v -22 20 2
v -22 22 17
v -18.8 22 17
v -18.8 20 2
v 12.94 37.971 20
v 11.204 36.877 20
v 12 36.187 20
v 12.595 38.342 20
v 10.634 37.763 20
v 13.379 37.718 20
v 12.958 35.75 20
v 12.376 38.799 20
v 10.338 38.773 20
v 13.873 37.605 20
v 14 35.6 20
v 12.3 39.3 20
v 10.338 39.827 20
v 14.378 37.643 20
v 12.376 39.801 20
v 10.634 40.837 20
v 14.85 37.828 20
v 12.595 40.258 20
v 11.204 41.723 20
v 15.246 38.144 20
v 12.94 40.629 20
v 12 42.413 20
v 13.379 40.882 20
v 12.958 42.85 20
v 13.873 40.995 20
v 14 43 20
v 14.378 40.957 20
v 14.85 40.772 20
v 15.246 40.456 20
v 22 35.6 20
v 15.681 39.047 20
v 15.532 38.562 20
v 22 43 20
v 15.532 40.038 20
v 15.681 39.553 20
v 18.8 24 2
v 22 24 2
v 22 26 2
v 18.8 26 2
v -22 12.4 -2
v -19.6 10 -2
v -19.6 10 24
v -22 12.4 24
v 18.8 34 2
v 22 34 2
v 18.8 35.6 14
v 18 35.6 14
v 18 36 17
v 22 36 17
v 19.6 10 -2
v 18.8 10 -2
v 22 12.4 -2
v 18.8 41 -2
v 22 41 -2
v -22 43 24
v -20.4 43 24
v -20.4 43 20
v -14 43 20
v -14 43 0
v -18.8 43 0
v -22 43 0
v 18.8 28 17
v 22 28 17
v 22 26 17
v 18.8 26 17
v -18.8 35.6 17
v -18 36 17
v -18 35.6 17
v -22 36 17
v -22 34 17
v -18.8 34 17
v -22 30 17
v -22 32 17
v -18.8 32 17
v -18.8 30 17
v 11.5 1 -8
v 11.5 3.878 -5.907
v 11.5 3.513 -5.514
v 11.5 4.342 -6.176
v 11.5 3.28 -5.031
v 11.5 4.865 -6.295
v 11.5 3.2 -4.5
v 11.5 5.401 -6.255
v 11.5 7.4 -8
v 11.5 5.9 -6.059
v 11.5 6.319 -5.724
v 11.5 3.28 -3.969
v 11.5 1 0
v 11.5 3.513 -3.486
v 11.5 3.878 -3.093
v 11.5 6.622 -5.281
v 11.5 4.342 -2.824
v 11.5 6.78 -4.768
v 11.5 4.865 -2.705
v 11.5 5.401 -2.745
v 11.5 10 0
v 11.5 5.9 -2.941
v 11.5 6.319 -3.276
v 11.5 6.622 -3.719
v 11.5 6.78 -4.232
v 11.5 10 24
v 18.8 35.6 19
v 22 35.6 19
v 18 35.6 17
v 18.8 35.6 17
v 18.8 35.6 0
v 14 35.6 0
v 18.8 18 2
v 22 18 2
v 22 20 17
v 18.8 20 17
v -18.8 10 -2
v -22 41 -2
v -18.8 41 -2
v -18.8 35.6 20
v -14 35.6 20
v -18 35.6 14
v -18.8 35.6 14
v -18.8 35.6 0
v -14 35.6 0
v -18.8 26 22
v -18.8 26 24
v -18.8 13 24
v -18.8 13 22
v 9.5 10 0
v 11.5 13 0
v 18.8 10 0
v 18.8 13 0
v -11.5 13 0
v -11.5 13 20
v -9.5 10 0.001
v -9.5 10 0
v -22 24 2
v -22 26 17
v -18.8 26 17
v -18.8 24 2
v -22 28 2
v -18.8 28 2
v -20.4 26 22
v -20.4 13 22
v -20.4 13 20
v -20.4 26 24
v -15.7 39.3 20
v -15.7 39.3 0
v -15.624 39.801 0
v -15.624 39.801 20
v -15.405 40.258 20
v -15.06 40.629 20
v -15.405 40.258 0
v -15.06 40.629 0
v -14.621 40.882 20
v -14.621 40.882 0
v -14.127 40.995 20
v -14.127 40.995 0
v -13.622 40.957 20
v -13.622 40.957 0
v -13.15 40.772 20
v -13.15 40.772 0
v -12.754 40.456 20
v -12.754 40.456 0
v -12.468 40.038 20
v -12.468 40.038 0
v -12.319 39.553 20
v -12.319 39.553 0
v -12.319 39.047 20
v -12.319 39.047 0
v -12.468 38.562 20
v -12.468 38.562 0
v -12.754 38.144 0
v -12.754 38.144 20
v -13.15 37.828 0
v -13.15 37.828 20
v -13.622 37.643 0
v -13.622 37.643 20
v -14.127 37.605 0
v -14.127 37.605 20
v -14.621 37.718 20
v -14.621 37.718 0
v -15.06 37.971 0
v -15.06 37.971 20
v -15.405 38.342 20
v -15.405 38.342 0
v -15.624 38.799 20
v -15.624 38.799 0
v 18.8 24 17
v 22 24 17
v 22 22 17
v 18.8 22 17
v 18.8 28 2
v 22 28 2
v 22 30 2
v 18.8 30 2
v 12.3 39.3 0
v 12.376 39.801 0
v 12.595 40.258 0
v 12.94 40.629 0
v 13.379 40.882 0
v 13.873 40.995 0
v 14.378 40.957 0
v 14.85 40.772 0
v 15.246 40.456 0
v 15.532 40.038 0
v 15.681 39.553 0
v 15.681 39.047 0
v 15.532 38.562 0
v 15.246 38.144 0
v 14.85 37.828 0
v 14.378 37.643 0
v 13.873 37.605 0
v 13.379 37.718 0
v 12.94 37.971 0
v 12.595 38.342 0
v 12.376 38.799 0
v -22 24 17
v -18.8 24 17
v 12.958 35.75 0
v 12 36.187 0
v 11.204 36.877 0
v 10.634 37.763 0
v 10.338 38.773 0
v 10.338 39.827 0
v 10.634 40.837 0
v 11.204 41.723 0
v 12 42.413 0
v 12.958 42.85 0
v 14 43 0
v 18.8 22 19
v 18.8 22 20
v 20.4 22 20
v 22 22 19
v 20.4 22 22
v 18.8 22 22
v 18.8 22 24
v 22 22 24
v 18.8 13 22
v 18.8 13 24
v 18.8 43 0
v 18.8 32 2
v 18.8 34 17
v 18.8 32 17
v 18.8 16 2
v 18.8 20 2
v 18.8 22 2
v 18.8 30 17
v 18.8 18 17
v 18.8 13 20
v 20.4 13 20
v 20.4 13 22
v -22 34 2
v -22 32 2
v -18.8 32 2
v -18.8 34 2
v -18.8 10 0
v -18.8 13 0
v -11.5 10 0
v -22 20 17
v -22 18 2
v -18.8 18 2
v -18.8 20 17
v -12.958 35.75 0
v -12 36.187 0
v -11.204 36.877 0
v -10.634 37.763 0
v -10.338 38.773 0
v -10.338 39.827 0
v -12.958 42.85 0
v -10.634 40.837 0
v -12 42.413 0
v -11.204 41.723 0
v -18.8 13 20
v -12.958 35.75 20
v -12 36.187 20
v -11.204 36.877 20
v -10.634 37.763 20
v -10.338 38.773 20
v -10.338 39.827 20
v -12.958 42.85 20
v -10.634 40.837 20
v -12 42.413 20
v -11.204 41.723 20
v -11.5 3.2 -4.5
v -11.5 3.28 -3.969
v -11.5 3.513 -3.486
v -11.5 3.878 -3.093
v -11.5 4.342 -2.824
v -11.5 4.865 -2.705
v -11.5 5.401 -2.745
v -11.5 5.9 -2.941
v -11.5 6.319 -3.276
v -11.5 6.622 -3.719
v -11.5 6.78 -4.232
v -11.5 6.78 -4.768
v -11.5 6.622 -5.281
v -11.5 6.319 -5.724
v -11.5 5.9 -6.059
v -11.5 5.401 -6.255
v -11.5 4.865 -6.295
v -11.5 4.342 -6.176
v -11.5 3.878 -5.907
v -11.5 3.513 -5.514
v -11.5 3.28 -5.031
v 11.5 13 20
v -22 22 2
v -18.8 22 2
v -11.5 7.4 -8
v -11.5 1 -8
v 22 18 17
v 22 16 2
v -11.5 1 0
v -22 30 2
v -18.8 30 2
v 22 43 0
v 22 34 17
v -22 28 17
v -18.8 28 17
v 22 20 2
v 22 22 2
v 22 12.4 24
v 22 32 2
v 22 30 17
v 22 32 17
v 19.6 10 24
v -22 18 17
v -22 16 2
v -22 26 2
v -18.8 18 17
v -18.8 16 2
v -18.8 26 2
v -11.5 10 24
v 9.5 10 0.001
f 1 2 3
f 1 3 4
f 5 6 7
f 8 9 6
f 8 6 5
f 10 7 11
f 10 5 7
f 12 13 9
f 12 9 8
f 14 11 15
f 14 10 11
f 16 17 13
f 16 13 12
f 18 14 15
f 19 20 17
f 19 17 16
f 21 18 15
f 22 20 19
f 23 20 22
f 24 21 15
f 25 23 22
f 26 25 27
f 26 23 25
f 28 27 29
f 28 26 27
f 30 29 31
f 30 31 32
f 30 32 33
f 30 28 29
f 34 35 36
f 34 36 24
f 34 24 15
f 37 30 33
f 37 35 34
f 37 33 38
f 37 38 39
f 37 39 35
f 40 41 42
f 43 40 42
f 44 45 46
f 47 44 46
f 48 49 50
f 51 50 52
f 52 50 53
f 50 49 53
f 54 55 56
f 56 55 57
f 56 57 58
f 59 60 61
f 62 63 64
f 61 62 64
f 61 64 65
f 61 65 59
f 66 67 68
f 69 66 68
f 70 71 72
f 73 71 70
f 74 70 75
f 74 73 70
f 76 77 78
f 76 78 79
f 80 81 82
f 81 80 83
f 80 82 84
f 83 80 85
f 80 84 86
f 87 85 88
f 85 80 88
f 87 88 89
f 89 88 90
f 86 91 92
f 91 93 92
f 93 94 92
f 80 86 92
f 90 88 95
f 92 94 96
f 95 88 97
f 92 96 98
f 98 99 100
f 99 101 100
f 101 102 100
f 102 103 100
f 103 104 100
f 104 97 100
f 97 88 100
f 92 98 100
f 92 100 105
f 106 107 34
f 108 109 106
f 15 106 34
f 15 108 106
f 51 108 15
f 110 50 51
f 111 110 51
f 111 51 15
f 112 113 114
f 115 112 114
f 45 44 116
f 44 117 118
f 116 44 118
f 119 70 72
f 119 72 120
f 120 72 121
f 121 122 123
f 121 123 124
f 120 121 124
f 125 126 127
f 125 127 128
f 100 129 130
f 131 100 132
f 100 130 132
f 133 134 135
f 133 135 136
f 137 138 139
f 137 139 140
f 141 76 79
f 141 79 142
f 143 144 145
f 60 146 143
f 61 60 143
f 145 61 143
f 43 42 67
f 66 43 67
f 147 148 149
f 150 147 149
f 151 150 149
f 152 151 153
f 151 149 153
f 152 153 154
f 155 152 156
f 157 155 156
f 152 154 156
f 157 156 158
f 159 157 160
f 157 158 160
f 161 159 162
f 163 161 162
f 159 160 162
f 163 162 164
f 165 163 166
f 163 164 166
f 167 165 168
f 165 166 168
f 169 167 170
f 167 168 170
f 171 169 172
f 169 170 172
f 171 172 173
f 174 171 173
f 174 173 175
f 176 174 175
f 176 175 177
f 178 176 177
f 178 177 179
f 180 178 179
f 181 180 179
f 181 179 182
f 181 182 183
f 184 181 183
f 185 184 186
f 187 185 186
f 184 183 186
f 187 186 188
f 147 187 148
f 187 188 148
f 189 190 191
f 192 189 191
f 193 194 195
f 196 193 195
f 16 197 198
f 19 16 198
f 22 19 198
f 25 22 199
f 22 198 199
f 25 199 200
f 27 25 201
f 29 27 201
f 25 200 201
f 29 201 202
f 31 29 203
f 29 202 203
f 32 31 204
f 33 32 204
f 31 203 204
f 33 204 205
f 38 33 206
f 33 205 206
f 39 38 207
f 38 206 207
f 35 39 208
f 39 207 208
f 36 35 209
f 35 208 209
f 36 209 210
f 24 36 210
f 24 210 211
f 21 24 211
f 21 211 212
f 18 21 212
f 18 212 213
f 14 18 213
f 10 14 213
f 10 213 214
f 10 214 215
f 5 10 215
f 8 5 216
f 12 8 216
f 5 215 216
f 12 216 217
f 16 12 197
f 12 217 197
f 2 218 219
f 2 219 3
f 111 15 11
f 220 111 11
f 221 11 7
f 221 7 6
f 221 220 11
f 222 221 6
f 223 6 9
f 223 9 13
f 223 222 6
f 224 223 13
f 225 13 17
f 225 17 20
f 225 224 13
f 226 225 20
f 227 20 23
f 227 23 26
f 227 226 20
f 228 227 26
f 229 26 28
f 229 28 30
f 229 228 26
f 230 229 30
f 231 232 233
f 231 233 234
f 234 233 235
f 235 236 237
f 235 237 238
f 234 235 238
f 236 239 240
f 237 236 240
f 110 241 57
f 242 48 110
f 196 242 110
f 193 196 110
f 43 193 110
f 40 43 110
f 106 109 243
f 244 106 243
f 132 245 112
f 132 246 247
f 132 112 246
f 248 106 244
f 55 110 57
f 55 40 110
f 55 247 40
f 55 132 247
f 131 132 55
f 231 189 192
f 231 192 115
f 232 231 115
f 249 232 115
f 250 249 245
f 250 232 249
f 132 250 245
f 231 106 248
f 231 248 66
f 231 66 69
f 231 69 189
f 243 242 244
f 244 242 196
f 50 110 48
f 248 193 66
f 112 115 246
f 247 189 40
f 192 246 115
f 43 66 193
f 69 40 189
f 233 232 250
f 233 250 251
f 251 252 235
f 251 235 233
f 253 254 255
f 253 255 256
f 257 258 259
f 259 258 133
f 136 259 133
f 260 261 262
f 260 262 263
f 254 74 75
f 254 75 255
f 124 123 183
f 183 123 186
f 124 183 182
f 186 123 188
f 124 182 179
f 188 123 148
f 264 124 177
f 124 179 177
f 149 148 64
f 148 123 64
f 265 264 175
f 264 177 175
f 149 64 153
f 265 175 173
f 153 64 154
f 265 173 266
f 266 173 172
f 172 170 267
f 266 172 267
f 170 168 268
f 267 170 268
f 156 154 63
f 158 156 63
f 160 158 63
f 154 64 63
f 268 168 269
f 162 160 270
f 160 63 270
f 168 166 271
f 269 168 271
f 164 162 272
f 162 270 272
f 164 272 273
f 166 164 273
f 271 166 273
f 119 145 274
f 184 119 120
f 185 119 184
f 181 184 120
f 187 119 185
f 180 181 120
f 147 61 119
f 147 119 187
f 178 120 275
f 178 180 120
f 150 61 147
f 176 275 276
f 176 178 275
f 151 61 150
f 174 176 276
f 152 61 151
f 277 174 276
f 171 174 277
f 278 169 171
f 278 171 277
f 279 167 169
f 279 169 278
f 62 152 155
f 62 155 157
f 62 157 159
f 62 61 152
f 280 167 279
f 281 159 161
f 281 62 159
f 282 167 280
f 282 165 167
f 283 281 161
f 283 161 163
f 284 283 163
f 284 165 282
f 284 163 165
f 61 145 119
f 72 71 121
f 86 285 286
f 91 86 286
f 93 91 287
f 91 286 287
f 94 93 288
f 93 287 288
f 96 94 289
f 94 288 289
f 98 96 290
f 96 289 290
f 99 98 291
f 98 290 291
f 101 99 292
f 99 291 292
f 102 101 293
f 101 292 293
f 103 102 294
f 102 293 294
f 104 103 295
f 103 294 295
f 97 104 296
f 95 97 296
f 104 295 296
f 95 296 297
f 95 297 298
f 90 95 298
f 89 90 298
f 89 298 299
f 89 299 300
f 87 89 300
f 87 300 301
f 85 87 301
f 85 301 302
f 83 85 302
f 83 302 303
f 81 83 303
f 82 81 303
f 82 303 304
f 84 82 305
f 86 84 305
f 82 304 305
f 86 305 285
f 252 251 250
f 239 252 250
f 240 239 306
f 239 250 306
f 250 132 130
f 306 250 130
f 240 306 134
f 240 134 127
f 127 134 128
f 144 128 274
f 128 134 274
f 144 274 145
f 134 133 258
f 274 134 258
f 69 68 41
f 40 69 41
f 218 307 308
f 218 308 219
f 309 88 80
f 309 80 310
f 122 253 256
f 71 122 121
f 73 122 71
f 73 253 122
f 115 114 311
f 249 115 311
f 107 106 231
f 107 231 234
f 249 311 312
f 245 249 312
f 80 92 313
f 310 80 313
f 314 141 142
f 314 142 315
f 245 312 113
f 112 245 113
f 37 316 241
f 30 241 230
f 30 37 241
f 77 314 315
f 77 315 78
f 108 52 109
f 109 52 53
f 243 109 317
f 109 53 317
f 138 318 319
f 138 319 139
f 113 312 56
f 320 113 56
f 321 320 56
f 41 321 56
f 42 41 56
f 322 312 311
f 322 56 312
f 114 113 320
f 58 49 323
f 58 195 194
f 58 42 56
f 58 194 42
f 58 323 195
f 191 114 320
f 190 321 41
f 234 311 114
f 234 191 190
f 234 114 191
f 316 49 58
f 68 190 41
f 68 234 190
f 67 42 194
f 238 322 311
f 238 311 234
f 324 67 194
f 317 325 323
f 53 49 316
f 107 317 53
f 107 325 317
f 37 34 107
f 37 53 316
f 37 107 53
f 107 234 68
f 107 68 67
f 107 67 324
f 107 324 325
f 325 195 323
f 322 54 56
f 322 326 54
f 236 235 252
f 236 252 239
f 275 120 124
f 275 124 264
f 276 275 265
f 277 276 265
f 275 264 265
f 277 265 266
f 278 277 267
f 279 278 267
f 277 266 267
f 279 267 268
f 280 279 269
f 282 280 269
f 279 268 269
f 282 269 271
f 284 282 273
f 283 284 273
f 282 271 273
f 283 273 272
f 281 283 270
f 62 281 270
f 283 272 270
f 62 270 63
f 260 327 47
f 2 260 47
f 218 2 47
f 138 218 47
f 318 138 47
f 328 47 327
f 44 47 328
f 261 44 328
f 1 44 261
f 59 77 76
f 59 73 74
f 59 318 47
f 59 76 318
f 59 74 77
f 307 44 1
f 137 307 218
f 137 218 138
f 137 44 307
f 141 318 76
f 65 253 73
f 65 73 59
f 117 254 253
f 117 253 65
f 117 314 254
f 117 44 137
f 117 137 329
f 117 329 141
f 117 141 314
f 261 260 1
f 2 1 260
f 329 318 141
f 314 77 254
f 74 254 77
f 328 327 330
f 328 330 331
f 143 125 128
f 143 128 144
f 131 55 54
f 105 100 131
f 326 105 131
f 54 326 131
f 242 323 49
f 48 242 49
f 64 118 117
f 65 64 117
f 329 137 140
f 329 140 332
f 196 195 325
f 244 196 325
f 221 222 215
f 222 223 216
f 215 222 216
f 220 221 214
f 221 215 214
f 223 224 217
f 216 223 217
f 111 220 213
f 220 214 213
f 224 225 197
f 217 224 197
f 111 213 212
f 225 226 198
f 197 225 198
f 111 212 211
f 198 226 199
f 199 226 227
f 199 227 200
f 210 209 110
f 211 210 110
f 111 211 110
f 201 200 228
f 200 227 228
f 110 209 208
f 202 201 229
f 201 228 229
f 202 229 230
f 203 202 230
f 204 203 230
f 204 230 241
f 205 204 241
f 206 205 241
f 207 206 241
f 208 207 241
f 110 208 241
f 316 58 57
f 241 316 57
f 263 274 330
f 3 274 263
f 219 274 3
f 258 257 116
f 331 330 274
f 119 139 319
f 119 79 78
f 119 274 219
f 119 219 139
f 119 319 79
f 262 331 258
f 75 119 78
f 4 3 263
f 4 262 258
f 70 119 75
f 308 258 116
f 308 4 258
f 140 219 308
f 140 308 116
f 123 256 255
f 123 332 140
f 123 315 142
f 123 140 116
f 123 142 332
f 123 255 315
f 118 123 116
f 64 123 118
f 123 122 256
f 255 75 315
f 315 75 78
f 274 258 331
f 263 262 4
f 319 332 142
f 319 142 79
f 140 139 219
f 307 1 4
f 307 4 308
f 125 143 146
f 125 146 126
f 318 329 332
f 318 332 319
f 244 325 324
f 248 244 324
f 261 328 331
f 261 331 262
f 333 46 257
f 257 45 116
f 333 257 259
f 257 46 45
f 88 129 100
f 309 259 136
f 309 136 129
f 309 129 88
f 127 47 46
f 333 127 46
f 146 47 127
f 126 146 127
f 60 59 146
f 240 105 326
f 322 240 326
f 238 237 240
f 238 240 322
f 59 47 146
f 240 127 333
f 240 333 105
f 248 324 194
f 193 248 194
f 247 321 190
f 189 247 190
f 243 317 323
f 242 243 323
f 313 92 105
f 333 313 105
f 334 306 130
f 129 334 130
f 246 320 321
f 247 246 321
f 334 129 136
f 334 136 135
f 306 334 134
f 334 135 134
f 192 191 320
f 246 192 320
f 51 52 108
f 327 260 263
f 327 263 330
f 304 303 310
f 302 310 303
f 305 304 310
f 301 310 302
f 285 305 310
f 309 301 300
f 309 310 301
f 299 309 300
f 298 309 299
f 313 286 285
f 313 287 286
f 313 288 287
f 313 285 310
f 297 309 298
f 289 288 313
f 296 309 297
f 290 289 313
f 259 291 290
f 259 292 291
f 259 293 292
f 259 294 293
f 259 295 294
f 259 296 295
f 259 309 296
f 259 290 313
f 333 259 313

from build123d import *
from OCP.BRepFilletAPI import BRepFilletAPI_MakeChamfer

# Parameters (mm, degrees)
SKETCH_1_W           = 44
SKETCH_1_H           = 34
EXTRUDE_1_DEPTH      = 24
CUT_EXTRUDE_1_DEPTH  = 31
SKETCH_5_W           = 23
SKETCH_5_H           = 9
EXTRUDE_4_DEPTH      = 8
EXTRUDE_5_DEPTH      = 23
SKETCH_7_R           = 1.8
CUT_EXTRUDE_2_DEPTH  = 23
CUT_EXTRUDE_4_DEPTH  = 19
CUT_EXTRUDE_6_REACH  = 62.285
CHAMFER_2_SIZE       = 2
CHAMFER_2_SIZE_2     = 3
SKETCH_11_R          = 1.7
EXTRUDE_6_DEPTH      = 20
CUT_EXTRUDE_7_DEPTH  = 4
CHAMFER_3_SIZE       = 2.4
SKETCH_14_W          = 40.8
SKETCH_14_H          = 4
CUT_EXTRUDE_8_DEPTH  = 18
SKETCH_15_W          = 44
SKETCH_15_H          = 1
CUT_EXTRUDE_9_DEPTH  = 24
SKETCH_16_W          = 3.2
SKETCH_16_H          = 13.6
CUT_EXTRUDE_10_DEPTH = 5
SKETCH_17_W          = 1.6
SKETCH_17_H          = 4
CUT_EXTRUDE_11_DEPTH = 7.4
EXTRUDE_7_DEPTH      = 2
CHAMFER_4_SIZE       = 2


with BuildPart() as part:
    # Эскиз1 → Бобышка-Вытянуть1 (new body)
    with BuildSketch(Plane.XY):
        with Locations((0, 27)):
            Rectangle(SKETCH_1_W, SKETCH_1_H)
    extrude(amount=EXTRUDE_1_DEPTH)

    # Эскиз2 → Вырез-Вытянуть1 (cut)
    with BuildSketch(Plane(origin=(0, 44, 0), x_dir=(1, 0, 0), z_dir=(0, 1, 0))):
        Polygon((-18.8, 0), (18.8, 0), (18.8, -20), (20.4, -20), (20.4, -22), (18.8, -22), (18.8, -24), (-18.8, -24), (-18.8, -22), (-20.4, -22), (-20.4, -20), (-18.8, -20), align=None)
    extrude(amount=-CUT_EXTRUDE_1_DEPTH, mode=Mode.SUBTRACT)



with BuildPart() as body_2:
    # Эскиз5 → Бобышка-Вытянуть4 (new body)
    with BuildSketch(Plane(origin=(0, 0, 0), x_dir=(-1, 0, 0), z_dir=(0, 0, -1))):
        with Locations((0, 5.5)):
            Rectangle(SKETCH_5_W, SKETCH_5_H)
    extrude(amount=EXTRUDE_4_DEPTH)


with BuildPart() as part_1:
    add(part.part)

    add(body_2.part)  # Бобышка-Вытянуть5 merges body 2
    # Эскиз6 → Бобышка-Вытянуть5 (add)
    with BuildSketch(Plane(origin=(11.5, 0, 0), x_dir=(0, 0, -1), z_dir=(1, 0, 0))):
        Polygon((0, 1), (-24, 10), (0, 10), align=None)
    extrude(amount=-EXTRUDE_5_DEPTH)

    # Эскиз7 → Вырез-Вытянуть2 (cut)
    with BuildSketch(Plane.ZY.offset(11.5)):
        with Locations(Location((-4.5, 5, 0), (0, 0, 270))):
            Circle(SKETCH_7_R)
    extrude(amount=-CUT_EXTRUDE_2_DEPTH, mode=Mode.SUBTRACT)

    # Эскиз8 → Вырез-Вытянуть4 (cut)
    with BuildSketch(Plane.ZY.offset(9.5)):
        Polygon((0, 10), (20, 13), (0, 13), align=None)
    extrude(amount=-CUT_EXTRUDE_4_DEPTH, mode=Mode.SUBTRACT)

    # Вырез-Вытянуть6: up to this face of the body (flat: up to its plane)
    cut_extrude_6_end = Plane(part_1.part.faces().sort_by_distance((11.5, 6.483913321, 3.661523268))[0])
    # Эскиз9 → Вырез-Вытянуть6 (cut, up to the picked face)
    with BuildSketch(Plane.ZY.offset(11.5), mode=Mode.PRIVATE) as cut_extrude_6_sk1:
        Polygon((0, 10), (-8, 7.4), (-8, 10), align=None)
    cut_extrude_6_tool1 = split(extrude(cut_extrude_6_sk1.sketch, amount=-CUT_EXTRUDE_6_REACH, mode=Mode.PRIVATE), bisect_by=cut_extrude_6_end, keep=Keep.BOTH, mode=Mode.PRIVATE)
    add(cut_extrude_6_tool1.solids().sort_by(Axis((-11.5, 9.133333, -5.333333), (1, 0, 0)))[0], mode=Mode.SUBTRACT)

    # Фаска2
    chamfer_2_edges_1 = [part_1.edges().sort_by_distance(p)[0] for p in [
        (-9.5, 13, 10),
    ]]
    chamfer_2_side_1 = [part_1.faces().sort_by_distance(p)[0] for p in [
        (-9.54, 13, 10),
    ]]
    chamfer_2_edges_2 = [part_1.edges().sort_by_distance(p)[0] for p in [
        (9.5, 13, 10),
    ]]
    chamfer_2_side_2 = [part_1.faces().sort_by_distance(p)[0] for p in [
        (9.5, 12.96, 10),
    ]]
    chamfer_2 = BRepFilletAPI_MakeChamfer(part_1.part.solid().wrapped)
    for e in chamfer_2_edges_1:
        chamfer_2.Add(CHAMFER_2_SIZE - 0.0001, CHAMFER_2_SIZE_2 - 0.0001, e.wrapped, chamfer_2_side_1[0].wrapped)
    for e in chamfer_2_edges_2:
        chamfer_2.Add(CHAMFER_2_SIZE_2 - 0.0001, CHAMFER_2_SIZE - 0.0001, e.wrapped, chamfer_2_side_2[0].wrapped)
    add(Compound.cast(chamfer_2.Shape()), mode=Mode.REPLACE)  # a hair under: the kernel refuses the full size

    # Эскиз11 → Бобышка-Вытянуть6 (add)
    # profile 1 of 2: a face of its own
    with BuildSketch(Plane(origin=(0, 0, 0), x_dir=(-1, 0, 0), z_dir=(0, 0, -1))):
        with BuildLine():
            Line((-14, 43), (-18.8, 43))
            Line((-18.8, 43), (-18.8, 35.6))
            Line((-18.8, 35.6), (-14, 35.6))
            ThreePointArc((-14, 35.6), (-10.3, 39.3), (-14, 43))
        make_face()
        with Locations((-14, 39.3)):
            Circle(SKETCH_11_R, mode=Mode.SUBTRACT)
    # profile 2 of 2: a face of its own
    with BuildSketch(Plane(origin=(0, 0, 0), x_dir=(-1, 0, 0), z_dir=(0, 0, -1))):
        with BuildLine():
            Line((18.8, 35.6), (14, 35.6))
            ThreePointArc((14, 35.6), (10.3, 39.3), (14, 43))
            Line((14, 43), (18.8, 43))
            Line((18.8, 43), (18.8, 35.6))
        make_face()
        with Locations((14, 39.3)):
            Circle(SKETCH_11_R, mode=Mode.SUBTRACT)
    extrude(amount=-EXTRUDE_6_DEPTH)

    # Эскиз13 → Вырез-Вытянуть7 (cut)
    with BuildSketch(Plane.ZY.offset(22)):
        Polygon((2, 34), (17, 36), (17, 34), (2, 32), align=None)
        Polygon((2, 30), (17, 32), (17, 30), (2, 28), align=None)
        Polygon((2, 26), (17, 28), (17, 26), (2, 24), align=None)
        Polygon((2, 22), (17, 24), (17, 22), (2, 20), align=None)
        Polygon((2, 18), (17, 20), (17, 18), (2, 16), align=None)
    cut_extrude_7 = extrude(amount=-CUT_EXTRUDE_7_DEPTH, mode=Mode.SUBTRACT)

    # Зеркальное отражение1: Вырез-Вытянуть7 across plane
    add(cut_extrude_7.mirror(Plane(origin=(0, 0, 0), x_dir=(0, 0, 1), z_dir=(1, 0, 0))), mode=Mode.SUBTRACT)

    # Фаска3
    chamfer_3_edges = [part_1.edges().sort_by_distance(p)[0] for p in [
        (22, 10, 12),
        (-22, 10, 12),
    ]]
    chamfer(chamfer_3_edges, length=CHAMFER_3_SIZE)

    # Эскиз14 → Вырез-Вытянуть8 (cut)
    with BuildSketch(Plane(origin=(0, 44, 0), x_dir=(1, 0, 0), z_dir=(0, 1, 0))):
        with Locations((0, -22)):
            Rectangle(SKETCH_14_W, SKETCH_14_H)
    extrude(amount=-CUT_EXTRUDE_8_DEPTH, mode=Mode.SUBTRACT)

    # Эскиз15 → Вырез-Вытянуть9 (cut)
    with BuildSketch(Plane(origin=(0, 0, 0), x_dir=(-1, 0, 0), z_dir=(0, 0, -1))):
        with Locations((0, 43.5)):
            Rectangle(SKETCH_15_W, SKETCH_15_H)
    extrude(amount=-CUT_EXTRUDE_9_DEPTH, mode=Mode.SUBTRACT)

    # Эскиз16 → Вырез-Вытянуть10 (cut)
    with BuildSketch(Plane.XY.offset(24)):
        with Locations((20.4, 28.8)):
            Rectangle(SKETCH_16_W, SKETCH_16_H)
    extrude(amount=-CUT_EXTRUDE_10_DEPTH, mode=Mode.SUBTRACT)

    # Эскиз17 → Вырез-Вытянуть11 (cut)
    with BuildSketch(Plane(origin=(0, 43, 0), x_dir=(1, 0, 0), z_dir=(0, 1, 0))):
        with Locations((21.2, -22)):
            Rectangle(SKETCH_17_W, SKETCH_17_H)
    extrude(amount=-CUT_EXTRUDE_11_DEPTH, mode=Mode.SUBTRACT)

    # Эскиз18 → Бобышка-Вытянуть7 (add)
    with BuildSketch(Plane(origin=(0, 0, 0), x_dir=(-1, 0, 0), z_dir=(0, 0, -1))):
        Polygon((-22, 43), (-18.8, 43), (-18.8, 10), (-19.6, 10), (-22, 12.4), align=None)
        Polygon((22, 12.4), (19.6, 10), (18.8, 10), (18.8, 43), (22, 43), align=None)
    extrude(amount=EXTRUDE_7_DEPTH)

    # Фаска4
    chamfer_4_edges = [part_1.edges().sort_by_distance(p)[0] for p in [
        (-20.4, 43, -2),
        (20.4, 43, -2),
    ]]
    chamfer(chamfer_4_edges, length=CHAMFER_4_SIZE)


solid = part_1.part
